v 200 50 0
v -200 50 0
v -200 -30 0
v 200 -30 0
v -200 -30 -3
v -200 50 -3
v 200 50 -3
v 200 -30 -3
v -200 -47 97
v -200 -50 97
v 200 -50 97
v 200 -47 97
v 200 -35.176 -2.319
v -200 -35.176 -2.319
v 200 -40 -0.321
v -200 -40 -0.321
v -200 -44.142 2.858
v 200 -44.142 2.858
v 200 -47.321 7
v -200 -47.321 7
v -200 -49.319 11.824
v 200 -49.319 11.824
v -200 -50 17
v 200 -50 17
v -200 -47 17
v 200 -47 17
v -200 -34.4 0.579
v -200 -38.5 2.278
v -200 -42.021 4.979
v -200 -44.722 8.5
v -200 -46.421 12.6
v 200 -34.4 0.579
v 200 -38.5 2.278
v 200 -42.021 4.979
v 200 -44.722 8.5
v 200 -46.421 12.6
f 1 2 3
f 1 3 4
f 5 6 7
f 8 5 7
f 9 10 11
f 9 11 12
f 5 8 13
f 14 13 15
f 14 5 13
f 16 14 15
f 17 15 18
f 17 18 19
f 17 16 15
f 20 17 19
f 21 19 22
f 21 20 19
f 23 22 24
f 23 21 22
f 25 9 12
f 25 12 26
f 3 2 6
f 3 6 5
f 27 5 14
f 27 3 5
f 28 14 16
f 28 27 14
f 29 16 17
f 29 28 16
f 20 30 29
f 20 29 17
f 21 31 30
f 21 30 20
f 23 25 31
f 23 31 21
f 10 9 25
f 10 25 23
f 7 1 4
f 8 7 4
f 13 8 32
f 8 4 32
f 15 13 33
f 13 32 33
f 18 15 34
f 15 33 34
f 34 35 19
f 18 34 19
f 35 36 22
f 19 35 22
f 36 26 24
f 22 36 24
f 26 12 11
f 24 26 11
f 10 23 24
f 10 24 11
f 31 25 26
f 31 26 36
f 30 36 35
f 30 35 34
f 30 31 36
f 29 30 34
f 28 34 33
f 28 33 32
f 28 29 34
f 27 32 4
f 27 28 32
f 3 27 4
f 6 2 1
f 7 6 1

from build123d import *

# Parameters (mm, degrees)
SKETCH_2_W                       = 400
SKETCH_2_H                       = 100
SM_BASE_FLANGE_1_DEPTH           = 3
SM_EDGE_FLANGE_1_STRIP_W         = 46
SM_EDGE_FLANGE_1_STRIP_H         = 3
SM_EDGE_FLANGE_1_STRIP_CUT_DEPTH = 400
SM_EDGE_FLANGE_1_DEPTH           = 400


# Sheet-metal steps are written as plain solids
with BuildPart() as part:
    # Sketch 2 → 基体-法兰1 (new body)
    with BuildSketch(Plane.XY):
        Rectangle(SKETCH_2_W, SKETCH_2_H)
    extrude(amount=-SM_BASE_FLANGE_1_DEPTH)

    # 边线-法兰1 strip (across the edge) → 边线-法兰1 strip cut (cut)
    with BuildSketch(Plane(origin=(-200, -50, 0), x_dir=(0, 1, 0), z_dir=(1, 0, 0))):
        with Locations((-3, -1.5)):
            Rectangle(SM_EDGE_FLANGE_1_STRIP_W, SM_EDGE_FLANGE_1_STRIP_H)
    extrude(amount=SM_EDGE_FLANGE_1_STRIP_CUT_DEPTH, mode=Mode.SUBTRACT)

    # 边线-法兰1 section (across the edge) → 边线-法兰1 (add)
    with BuildSketch(Plane(origin=(-200, -50, 0), x_dir=(0, 1, 0), z_dir=(1, 0, 0))):
        with BuildLine():
            Line((0, 17), (0, 97))
            Line((0, 97), (3, 97))
            Line((3, 97), (3, 17))
            ThreePointArc((3, 17), (7.97918472, 4.97918472), (20, 0))
            Line((20, 0), (20, -3))
            ThreePointArc((20, -3), (5.857864376, 2.857864376), (0, 17))
        make_face()
    extrude(amount=SM_EDGE_FLANGE_1_DEPTH)


solid = part.part
